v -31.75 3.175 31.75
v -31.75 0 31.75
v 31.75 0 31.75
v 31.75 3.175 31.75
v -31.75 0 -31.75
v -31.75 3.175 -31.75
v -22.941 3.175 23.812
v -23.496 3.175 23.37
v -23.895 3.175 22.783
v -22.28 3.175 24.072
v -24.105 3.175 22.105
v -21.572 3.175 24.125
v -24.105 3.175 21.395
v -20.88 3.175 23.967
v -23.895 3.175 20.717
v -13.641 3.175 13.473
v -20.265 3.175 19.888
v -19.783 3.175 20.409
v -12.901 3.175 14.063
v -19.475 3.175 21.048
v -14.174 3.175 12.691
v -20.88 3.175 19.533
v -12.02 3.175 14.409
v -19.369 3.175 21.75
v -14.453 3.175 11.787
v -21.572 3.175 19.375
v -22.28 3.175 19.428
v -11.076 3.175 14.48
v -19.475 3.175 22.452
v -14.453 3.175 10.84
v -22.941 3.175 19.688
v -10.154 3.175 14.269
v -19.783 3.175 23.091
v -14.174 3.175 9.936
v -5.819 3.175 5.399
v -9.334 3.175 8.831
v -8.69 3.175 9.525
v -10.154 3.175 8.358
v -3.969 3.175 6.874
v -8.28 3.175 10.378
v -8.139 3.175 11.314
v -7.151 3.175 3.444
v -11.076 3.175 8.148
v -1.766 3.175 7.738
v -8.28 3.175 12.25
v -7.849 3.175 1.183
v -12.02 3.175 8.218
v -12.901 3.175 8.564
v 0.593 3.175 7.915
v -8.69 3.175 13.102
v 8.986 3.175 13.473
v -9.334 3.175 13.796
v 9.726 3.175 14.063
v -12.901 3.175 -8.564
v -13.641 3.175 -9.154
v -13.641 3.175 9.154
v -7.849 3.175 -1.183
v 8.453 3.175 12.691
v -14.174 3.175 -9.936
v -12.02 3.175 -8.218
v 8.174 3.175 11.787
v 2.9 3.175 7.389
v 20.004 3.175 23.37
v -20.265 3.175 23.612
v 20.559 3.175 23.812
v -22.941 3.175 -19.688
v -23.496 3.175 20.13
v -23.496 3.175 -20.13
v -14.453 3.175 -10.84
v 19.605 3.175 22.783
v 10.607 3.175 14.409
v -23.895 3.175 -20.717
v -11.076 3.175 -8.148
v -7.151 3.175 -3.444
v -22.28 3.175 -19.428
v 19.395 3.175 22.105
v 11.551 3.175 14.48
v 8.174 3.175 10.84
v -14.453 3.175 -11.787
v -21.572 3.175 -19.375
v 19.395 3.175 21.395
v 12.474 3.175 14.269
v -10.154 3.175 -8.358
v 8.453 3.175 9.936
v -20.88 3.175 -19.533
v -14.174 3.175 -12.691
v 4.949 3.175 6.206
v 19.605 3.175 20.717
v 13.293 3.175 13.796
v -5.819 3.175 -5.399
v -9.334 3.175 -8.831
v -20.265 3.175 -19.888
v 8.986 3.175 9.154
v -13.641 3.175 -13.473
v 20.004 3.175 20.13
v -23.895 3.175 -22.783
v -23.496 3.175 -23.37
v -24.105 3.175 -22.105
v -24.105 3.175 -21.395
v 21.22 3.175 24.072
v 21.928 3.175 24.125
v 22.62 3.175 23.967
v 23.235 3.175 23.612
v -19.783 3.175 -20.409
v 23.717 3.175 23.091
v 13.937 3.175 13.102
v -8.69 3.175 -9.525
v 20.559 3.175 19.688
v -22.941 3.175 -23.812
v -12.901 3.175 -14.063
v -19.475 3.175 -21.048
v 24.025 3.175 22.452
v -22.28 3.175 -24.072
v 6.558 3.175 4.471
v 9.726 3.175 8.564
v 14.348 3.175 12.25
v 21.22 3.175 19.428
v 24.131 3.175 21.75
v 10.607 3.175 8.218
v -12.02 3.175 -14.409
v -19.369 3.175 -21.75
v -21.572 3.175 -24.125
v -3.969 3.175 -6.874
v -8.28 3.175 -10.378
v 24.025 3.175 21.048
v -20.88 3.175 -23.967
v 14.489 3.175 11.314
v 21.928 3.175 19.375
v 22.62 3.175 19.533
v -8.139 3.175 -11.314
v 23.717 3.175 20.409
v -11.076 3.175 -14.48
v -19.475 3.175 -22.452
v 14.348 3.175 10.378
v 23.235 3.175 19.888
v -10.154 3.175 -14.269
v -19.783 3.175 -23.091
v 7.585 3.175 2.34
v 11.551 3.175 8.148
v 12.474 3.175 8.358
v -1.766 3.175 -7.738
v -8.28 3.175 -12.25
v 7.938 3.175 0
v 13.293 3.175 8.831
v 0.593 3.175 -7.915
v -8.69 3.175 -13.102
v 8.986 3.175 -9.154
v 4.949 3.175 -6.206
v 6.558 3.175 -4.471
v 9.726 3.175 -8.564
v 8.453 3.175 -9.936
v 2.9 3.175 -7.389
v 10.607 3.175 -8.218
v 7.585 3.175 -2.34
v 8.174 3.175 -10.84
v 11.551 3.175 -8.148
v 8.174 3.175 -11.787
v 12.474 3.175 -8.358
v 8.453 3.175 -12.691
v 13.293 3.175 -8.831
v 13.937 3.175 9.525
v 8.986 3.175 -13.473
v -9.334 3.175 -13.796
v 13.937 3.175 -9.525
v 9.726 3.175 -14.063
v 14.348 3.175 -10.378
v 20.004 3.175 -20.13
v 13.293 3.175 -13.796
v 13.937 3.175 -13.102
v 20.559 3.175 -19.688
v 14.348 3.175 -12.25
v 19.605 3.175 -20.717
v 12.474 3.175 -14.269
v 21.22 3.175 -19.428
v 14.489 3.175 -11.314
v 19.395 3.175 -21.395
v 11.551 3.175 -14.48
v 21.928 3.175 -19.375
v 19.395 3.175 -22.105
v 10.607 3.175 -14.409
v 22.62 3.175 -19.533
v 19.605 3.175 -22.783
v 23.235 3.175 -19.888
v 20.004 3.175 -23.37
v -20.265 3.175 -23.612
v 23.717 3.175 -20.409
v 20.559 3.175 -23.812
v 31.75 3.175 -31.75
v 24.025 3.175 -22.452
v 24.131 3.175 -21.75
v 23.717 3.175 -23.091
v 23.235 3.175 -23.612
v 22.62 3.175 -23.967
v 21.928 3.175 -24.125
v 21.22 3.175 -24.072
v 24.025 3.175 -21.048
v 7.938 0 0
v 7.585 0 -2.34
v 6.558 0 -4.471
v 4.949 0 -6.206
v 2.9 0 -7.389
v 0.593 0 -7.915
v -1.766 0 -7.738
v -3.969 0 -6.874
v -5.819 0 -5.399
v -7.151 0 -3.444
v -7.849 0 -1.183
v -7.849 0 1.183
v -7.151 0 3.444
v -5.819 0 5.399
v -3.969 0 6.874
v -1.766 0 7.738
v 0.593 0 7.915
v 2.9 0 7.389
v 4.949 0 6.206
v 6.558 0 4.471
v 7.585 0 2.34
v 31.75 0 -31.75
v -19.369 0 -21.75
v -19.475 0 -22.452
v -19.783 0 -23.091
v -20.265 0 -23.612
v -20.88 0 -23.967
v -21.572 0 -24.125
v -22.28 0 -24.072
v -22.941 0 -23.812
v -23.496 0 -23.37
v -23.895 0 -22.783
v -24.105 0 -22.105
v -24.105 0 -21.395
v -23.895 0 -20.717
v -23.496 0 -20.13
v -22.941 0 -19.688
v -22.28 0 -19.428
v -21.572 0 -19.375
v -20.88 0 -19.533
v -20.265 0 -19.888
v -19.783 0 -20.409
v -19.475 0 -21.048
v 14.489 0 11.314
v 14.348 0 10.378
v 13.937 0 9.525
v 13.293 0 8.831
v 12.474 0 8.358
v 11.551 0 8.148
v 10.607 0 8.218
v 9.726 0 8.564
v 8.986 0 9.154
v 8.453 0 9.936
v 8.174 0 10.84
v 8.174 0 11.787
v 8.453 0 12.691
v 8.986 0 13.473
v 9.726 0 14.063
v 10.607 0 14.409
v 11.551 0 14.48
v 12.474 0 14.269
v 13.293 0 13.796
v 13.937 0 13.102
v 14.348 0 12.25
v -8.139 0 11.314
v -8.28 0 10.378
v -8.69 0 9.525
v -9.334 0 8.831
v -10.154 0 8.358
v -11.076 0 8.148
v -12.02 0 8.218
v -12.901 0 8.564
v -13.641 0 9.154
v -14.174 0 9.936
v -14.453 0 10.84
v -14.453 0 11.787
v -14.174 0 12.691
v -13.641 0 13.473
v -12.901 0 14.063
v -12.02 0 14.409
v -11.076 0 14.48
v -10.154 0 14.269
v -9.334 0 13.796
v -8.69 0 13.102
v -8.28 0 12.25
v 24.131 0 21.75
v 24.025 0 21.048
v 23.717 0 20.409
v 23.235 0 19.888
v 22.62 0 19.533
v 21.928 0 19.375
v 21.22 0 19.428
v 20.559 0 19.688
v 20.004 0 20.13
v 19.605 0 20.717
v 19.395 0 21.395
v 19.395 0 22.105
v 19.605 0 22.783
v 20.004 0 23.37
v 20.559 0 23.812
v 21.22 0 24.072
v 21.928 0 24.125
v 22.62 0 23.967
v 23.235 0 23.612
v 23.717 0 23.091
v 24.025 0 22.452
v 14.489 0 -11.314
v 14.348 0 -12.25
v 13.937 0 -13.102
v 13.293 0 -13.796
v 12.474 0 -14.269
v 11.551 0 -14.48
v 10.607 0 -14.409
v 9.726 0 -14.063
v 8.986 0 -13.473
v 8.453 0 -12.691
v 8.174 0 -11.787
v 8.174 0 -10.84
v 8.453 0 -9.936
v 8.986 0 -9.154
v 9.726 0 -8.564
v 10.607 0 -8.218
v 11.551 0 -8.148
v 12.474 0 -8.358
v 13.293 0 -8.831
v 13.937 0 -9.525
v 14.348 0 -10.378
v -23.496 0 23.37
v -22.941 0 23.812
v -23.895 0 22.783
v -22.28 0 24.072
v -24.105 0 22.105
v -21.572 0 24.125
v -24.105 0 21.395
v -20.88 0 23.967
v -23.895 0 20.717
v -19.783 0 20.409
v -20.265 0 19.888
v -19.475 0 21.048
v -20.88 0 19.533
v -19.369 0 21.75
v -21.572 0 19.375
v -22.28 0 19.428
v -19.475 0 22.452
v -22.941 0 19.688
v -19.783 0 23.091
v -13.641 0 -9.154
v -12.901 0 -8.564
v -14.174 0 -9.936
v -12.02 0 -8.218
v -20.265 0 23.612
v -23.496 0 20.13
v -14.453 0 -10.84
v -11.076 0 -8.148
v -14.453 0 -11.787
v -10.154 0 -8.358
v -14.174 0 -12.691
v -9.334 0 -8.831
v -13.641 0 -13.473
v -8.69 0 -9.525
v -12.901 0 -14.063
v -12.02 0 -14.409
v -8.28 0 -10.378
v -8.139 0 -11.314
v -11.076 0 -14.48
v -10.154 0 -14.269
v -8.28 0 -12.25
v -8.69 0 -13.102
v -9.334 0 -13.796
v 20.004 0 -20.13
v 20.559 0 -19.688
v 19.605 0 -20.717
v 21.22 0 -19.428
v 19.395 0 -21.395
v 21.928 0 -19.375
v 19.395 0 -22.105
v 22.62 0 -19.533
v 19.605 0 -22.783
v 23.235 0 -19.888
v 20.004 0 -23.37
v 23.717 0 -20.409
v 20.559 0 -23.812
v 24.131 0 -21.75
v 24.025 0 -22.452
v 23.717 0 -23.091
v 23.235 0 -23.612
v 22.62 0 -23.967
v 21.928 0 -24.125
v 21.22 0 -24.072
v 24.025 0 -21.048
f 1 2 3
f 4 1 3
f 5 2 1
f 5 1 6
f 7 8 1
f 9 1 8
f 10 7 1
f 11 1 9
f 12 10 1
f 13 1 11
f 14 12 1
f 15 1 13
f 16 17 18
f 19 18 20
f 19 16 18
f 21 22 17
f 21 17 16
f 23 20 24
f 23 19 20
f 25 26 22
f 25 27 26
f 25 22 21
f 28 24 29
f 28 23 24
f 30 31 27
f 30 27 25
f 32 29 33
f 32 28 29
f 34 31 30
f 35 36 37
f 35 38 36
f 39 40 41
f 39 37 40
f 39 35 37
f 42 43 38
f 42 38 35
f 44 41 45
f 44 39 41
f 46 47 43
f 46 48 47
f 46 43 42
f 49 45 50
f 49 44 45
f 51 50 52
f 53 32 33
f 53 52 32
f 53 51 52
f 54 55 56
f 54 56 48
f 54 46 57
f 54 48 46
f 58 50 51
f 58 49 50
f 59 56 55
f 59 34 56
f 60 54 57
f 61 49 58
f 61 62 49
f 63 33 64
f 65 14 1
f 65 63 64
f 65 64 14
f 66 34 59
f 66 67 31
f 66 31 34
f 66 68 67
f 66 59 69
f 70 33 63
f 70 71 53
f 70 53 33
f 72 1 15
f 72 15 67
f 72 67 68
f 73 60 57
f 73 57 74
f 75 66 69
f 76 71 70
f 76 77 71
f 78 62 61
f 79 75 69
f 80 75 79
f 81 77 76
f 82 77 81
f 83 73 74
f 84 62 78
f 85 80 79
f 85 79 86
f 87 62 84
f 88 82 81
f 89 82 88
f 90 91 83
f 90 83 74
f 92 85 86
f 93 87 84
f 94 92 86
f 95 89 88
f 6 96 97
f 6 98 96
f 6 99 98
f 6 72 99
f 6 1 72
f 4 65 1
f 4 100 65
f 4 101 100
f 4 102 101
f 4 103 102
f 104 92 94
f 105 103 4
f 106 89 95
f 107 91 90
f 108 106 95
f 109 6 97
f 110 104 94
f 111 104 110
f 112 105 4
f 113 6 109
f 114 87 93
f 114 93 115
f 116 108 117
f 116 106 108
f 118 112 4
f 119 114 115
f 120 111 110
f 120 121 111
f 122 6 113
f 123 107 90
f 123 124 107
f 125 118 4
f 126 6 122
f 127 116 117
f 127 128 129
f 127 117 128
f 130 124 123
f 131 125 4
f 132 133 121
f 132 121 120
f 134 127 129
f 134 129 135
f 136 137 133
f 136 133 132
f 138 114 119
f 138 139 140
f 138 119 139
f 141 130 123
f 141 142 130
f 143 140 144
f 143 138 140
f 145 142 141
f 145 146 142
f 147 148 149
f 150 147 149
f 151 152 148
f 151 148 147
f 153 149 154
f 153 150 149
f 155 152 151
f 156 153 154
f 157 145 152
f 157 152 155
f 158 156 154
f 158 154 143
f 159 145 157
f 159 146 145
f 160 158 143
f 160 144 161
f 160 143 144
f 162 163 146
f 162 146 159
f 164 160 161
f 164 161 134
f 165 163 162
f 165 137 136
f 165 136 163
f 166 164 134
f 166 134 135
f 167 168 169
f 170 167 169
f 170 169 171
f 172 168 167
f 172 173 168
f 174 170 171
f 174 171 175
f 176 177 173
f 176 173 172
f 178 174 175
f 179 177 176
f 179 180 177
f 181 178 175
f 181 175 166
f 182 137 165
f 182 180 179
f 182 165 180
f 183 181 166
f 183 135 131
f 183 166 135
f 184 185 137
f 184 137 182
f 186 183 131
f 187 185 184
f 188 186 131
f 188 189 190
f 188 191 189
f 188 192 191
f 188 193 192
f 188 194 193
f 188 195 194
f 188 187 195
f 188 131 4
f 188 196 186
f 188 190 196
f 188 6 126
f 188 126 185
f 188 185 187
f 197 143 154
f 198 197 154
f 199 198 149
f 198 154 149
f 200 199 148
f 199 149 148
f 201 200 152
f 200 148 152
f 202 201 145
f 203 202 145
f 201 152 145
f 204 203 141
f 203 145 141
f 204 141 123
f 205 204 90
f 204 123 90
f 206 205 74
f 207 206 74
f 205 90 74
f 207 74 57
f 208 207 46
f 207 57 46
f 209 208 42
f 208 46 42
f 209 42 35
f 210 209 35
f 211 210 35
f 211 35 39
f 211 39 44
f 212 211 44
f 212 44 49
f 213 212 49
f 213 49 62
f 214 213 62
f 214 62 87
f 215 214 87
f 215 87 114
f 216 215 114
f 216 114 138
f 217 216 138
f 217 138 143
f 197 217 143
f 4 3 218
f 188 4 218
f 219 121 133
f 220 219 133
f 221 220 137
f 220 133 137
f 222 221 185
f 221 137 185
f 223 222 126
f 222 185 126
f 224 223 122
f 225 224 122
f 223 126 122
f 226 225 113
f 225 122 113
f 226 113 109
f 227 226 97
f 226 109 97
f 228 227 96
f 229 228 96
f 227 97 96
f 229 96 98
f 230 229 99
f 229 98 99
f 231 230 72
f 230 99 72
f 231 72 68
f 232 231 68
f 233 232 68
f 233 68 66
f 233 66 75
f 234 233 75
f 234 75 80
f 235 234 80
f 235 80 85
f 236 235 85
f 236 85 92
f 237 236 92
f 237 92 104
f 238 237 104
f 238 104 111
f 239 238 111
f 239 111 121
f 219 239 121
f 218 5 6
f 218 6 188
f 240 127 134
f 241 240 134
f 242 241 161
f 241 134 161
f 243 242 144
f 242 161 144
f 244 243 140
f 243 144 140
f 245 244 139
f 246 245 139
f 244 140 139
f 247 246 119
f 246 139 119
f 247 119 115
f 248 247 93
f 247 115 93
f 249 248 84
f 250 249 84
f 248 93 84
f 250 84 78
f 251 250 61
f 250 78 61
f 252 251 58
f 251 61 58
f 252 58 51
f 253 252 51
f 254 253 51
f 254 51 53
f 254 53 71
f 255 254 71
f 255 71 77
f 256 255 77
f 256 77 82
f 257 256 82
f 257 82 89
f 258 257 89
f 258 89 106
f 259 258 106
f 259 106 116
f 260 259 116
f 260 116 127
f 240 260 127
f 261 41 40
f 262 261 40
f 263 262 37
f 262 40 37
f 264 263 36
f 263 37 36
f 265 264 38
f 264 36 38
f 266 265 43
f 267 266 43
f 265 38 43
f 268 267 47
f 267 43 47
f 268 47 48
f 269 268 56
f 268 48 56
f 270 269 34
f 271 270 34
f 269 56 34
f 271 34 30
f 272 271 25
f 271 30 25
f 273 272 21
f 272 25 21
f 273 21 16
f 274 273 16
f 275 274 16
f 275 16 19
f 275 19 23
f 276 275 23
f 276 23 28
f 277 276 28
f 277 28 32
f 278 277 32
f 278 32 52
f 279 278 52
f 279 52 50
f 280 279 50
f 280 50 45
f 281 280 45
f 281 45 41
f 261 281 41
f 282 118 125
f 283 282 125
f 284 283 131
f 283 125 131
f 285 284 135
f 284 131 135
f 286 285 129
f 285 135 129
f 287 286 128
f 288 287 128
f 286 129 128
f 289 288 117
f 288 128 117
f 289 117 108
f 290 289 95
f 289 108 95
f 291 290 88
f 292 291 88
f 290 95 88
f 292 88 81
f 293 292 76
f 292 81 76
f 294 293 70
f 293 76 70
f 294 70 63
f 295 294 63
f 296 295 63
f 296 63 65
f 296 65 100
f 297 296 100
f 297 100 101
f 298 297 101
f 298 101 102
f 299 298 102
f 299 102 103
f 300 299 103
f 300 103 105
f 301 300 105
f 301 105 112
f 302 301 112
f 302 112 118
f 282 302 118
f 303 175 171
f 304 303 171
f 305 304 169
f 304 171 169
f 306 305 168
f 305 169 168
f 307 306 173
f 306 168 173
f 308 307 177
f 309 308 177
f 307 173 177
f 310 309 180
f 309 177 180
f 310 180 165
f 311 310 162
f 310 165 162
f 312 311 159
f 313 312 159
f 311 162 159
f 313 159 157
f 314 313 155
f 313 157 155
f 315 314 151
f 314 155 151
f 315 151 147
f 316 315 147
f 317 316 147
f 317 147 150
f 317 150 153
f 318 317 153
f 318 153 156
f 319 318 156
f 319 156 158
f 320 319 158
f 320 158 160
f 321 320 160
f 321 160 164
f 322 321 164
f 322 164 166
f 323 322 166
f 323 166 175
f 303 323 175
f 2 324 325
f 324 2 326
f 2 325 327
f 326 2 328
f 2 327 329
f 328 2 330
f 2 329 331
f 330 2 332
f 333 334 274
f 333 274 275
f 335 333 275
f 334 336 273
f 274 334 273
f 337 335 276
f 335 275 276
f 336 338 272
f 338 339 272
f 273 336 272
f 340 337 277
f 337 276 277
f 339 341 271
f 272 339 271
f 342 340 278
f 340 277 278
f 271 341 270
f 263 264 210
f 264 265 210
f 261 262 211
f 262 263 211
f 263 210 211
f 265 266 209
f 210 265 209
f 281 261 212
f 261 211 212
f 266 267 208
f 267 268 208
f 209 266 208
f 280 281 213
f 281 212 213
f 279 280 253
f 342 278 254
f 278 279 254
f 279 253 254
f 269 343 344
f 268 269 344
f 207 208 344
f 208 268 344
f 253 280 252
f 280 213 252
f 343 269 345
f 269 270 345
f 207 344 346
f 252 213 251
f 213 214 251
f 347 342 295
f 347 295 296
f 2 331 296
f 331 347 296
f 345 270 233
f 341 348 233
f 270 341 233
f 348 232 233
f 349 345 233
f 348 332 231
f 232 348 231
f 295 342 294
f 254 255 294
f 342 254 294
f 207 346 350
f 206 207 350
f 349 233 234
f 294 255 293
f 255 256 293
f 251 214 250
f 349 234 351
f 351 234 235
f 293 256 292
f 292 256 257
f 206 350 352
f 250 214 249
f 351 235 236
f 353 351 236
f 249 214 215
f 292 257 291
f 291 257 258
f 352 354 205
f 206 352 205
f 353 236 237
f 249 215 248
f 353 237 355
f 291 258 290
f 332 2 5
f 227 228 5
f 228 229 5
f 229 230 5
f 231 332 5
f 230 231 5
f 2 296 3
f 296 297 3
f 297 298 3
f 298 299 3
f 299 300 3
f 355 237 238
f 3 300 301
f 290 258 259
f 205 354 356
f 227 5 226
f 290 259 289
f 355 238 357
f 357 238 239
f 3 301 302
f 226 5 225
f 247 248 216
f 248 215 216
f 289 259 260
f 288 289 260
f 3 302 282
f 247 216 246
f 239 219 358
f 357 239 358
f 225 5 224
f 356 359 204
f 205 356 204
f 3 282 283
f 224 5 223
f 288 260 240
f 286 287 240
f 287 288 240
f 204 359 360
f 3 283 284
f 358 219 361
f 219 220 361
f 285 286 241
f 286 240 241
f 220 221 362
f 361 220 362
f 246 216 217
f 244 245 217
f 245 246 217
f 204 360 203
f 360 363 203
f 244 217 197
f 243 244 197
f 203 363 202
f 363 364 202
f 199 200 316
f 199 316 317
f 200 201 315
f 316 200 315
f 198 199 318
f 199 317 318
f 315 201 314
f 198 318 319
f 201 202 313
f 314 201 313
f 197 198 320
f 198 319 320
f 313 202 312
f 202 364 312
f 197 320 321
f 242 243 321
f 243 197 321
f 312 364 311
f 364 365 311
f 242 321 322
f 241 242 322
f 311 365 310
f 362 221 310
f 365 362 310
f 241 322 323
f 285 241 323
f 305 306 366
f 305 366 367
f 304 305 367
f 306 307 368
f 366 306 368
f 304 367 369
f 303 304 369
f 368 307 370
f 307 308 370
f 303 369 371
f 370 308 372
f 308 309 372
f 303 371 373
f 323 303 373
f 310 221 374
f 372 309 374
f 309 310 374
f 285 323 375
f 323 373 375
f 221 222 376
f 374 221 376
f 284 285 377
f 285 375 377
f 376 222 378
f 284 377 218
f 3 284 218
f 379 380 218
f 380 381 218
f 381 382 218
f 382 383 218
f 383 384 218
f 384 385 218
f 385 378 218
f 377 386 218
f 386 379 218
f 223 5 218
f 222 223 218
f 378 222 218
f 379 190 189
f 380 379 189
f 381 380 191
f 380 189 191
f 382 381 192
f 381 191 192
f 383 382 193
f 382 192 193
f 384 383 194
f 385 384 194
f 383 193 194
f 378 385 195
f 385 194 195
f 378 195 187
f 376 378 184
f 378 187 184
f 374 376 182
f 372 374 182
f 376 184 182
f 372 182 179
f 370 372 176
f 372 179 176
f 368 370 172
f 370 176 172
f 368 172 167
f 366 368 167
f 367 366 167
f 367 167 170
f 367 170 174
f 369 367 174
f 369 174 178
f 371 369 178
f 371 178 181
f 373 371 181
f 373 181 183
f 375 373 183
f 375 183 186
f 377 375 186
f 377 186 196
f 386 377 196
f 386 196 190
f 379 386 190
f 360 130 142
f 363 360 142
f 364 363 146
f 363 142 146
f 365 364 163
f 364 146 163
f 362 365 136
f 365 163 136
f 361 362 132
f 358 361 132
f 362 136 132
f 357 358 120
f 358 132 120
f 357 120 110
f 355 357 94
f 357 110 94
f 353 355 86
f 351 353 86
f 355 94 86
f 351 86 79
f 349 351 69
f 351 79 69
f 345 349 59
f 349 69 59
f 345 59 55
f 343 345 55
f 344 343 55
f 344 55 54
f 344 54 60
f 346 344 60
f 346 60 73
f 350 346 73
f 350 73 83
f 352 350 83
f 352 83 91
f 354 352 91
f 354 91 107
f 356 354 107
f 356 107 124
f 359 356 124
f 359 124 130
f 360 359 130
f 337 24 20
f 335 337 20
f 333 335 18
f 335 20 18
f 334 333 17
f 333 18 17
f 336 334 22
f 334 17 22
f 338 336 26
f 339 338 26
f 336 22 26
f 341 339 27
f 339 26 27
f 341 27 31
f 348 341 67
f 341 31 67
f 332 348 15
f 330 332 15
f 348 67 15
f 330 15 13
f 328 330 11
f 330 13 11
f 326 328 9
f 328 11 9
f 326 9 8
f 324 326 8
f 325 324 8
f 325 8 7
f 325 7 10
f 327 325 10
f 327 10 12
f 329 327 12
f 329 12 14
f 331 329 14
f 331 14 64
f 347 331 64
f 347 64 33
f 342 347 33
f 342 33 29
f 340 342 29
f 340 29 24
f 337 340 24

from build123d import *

# Parameters (mm, degrees)
SKETCH1_W           = 63.5
SKETCH1_H           = 63.5
BOSS_EXTRUDE1_DEPTH = 3.175
SKETCH2_R           = 3.175
SKETCH2_R_2         = 7.9375
SKETCH2_R_3         = 2.38125
CUT_EXTRUDE1_DEPTH  = 4.175


with BuildPart() as part:
    # Sketch1 → Boss-Extrude1 (new body)
    with BuildSketch(Plane(origin=(0, 0, 0), x_dir=(1, 0, 0), z_dir=(0, 1, 0))):
        Rectangle(SKETCH1_W, SKETCH1_H)
    extrude(amount=BOSS_EXTRUDE1_DEPTH)

    # Sketch2 → Cut-Extrude1 (cut, through all)
    with BuildSketch(Plane(origin=(0, 3.175, 0), x_dir=(1, 0, 0), z_dir=(0, 1, 0))):
        with Locations((11.313708499, 11.313708499)):
            Circle(SKETCH2_R)
        with Locations((11.313708499, -11.313708499)):
            Circle(SKETCH2_R)
        with Locations((-11.313708499, -11.313708499)):
            Circle(SKETCH2_R)
        with Locations((-11.313708499, 11.313708499)):
            Circle(SKETCH2_R)
        Circle(SKETCH2_R_2)
        with Locations((-21.75, -21.75)):
            Circle(SKETCH2_R_3)
        with Locations((21.75, -21.75)):
            Circle(SKETCH2_R_3)
        with Locations((21.75, 21.75)):
            Circle(SKETCH2_R_3)
        with Locations((-21.75, 21.75)):
            Circle(SKETCH2_R_3)
    extrude(amount=-CUT_EXTRUDE1_DEPTH, mode=Mode.SUBTRACT)


solid = part.part
